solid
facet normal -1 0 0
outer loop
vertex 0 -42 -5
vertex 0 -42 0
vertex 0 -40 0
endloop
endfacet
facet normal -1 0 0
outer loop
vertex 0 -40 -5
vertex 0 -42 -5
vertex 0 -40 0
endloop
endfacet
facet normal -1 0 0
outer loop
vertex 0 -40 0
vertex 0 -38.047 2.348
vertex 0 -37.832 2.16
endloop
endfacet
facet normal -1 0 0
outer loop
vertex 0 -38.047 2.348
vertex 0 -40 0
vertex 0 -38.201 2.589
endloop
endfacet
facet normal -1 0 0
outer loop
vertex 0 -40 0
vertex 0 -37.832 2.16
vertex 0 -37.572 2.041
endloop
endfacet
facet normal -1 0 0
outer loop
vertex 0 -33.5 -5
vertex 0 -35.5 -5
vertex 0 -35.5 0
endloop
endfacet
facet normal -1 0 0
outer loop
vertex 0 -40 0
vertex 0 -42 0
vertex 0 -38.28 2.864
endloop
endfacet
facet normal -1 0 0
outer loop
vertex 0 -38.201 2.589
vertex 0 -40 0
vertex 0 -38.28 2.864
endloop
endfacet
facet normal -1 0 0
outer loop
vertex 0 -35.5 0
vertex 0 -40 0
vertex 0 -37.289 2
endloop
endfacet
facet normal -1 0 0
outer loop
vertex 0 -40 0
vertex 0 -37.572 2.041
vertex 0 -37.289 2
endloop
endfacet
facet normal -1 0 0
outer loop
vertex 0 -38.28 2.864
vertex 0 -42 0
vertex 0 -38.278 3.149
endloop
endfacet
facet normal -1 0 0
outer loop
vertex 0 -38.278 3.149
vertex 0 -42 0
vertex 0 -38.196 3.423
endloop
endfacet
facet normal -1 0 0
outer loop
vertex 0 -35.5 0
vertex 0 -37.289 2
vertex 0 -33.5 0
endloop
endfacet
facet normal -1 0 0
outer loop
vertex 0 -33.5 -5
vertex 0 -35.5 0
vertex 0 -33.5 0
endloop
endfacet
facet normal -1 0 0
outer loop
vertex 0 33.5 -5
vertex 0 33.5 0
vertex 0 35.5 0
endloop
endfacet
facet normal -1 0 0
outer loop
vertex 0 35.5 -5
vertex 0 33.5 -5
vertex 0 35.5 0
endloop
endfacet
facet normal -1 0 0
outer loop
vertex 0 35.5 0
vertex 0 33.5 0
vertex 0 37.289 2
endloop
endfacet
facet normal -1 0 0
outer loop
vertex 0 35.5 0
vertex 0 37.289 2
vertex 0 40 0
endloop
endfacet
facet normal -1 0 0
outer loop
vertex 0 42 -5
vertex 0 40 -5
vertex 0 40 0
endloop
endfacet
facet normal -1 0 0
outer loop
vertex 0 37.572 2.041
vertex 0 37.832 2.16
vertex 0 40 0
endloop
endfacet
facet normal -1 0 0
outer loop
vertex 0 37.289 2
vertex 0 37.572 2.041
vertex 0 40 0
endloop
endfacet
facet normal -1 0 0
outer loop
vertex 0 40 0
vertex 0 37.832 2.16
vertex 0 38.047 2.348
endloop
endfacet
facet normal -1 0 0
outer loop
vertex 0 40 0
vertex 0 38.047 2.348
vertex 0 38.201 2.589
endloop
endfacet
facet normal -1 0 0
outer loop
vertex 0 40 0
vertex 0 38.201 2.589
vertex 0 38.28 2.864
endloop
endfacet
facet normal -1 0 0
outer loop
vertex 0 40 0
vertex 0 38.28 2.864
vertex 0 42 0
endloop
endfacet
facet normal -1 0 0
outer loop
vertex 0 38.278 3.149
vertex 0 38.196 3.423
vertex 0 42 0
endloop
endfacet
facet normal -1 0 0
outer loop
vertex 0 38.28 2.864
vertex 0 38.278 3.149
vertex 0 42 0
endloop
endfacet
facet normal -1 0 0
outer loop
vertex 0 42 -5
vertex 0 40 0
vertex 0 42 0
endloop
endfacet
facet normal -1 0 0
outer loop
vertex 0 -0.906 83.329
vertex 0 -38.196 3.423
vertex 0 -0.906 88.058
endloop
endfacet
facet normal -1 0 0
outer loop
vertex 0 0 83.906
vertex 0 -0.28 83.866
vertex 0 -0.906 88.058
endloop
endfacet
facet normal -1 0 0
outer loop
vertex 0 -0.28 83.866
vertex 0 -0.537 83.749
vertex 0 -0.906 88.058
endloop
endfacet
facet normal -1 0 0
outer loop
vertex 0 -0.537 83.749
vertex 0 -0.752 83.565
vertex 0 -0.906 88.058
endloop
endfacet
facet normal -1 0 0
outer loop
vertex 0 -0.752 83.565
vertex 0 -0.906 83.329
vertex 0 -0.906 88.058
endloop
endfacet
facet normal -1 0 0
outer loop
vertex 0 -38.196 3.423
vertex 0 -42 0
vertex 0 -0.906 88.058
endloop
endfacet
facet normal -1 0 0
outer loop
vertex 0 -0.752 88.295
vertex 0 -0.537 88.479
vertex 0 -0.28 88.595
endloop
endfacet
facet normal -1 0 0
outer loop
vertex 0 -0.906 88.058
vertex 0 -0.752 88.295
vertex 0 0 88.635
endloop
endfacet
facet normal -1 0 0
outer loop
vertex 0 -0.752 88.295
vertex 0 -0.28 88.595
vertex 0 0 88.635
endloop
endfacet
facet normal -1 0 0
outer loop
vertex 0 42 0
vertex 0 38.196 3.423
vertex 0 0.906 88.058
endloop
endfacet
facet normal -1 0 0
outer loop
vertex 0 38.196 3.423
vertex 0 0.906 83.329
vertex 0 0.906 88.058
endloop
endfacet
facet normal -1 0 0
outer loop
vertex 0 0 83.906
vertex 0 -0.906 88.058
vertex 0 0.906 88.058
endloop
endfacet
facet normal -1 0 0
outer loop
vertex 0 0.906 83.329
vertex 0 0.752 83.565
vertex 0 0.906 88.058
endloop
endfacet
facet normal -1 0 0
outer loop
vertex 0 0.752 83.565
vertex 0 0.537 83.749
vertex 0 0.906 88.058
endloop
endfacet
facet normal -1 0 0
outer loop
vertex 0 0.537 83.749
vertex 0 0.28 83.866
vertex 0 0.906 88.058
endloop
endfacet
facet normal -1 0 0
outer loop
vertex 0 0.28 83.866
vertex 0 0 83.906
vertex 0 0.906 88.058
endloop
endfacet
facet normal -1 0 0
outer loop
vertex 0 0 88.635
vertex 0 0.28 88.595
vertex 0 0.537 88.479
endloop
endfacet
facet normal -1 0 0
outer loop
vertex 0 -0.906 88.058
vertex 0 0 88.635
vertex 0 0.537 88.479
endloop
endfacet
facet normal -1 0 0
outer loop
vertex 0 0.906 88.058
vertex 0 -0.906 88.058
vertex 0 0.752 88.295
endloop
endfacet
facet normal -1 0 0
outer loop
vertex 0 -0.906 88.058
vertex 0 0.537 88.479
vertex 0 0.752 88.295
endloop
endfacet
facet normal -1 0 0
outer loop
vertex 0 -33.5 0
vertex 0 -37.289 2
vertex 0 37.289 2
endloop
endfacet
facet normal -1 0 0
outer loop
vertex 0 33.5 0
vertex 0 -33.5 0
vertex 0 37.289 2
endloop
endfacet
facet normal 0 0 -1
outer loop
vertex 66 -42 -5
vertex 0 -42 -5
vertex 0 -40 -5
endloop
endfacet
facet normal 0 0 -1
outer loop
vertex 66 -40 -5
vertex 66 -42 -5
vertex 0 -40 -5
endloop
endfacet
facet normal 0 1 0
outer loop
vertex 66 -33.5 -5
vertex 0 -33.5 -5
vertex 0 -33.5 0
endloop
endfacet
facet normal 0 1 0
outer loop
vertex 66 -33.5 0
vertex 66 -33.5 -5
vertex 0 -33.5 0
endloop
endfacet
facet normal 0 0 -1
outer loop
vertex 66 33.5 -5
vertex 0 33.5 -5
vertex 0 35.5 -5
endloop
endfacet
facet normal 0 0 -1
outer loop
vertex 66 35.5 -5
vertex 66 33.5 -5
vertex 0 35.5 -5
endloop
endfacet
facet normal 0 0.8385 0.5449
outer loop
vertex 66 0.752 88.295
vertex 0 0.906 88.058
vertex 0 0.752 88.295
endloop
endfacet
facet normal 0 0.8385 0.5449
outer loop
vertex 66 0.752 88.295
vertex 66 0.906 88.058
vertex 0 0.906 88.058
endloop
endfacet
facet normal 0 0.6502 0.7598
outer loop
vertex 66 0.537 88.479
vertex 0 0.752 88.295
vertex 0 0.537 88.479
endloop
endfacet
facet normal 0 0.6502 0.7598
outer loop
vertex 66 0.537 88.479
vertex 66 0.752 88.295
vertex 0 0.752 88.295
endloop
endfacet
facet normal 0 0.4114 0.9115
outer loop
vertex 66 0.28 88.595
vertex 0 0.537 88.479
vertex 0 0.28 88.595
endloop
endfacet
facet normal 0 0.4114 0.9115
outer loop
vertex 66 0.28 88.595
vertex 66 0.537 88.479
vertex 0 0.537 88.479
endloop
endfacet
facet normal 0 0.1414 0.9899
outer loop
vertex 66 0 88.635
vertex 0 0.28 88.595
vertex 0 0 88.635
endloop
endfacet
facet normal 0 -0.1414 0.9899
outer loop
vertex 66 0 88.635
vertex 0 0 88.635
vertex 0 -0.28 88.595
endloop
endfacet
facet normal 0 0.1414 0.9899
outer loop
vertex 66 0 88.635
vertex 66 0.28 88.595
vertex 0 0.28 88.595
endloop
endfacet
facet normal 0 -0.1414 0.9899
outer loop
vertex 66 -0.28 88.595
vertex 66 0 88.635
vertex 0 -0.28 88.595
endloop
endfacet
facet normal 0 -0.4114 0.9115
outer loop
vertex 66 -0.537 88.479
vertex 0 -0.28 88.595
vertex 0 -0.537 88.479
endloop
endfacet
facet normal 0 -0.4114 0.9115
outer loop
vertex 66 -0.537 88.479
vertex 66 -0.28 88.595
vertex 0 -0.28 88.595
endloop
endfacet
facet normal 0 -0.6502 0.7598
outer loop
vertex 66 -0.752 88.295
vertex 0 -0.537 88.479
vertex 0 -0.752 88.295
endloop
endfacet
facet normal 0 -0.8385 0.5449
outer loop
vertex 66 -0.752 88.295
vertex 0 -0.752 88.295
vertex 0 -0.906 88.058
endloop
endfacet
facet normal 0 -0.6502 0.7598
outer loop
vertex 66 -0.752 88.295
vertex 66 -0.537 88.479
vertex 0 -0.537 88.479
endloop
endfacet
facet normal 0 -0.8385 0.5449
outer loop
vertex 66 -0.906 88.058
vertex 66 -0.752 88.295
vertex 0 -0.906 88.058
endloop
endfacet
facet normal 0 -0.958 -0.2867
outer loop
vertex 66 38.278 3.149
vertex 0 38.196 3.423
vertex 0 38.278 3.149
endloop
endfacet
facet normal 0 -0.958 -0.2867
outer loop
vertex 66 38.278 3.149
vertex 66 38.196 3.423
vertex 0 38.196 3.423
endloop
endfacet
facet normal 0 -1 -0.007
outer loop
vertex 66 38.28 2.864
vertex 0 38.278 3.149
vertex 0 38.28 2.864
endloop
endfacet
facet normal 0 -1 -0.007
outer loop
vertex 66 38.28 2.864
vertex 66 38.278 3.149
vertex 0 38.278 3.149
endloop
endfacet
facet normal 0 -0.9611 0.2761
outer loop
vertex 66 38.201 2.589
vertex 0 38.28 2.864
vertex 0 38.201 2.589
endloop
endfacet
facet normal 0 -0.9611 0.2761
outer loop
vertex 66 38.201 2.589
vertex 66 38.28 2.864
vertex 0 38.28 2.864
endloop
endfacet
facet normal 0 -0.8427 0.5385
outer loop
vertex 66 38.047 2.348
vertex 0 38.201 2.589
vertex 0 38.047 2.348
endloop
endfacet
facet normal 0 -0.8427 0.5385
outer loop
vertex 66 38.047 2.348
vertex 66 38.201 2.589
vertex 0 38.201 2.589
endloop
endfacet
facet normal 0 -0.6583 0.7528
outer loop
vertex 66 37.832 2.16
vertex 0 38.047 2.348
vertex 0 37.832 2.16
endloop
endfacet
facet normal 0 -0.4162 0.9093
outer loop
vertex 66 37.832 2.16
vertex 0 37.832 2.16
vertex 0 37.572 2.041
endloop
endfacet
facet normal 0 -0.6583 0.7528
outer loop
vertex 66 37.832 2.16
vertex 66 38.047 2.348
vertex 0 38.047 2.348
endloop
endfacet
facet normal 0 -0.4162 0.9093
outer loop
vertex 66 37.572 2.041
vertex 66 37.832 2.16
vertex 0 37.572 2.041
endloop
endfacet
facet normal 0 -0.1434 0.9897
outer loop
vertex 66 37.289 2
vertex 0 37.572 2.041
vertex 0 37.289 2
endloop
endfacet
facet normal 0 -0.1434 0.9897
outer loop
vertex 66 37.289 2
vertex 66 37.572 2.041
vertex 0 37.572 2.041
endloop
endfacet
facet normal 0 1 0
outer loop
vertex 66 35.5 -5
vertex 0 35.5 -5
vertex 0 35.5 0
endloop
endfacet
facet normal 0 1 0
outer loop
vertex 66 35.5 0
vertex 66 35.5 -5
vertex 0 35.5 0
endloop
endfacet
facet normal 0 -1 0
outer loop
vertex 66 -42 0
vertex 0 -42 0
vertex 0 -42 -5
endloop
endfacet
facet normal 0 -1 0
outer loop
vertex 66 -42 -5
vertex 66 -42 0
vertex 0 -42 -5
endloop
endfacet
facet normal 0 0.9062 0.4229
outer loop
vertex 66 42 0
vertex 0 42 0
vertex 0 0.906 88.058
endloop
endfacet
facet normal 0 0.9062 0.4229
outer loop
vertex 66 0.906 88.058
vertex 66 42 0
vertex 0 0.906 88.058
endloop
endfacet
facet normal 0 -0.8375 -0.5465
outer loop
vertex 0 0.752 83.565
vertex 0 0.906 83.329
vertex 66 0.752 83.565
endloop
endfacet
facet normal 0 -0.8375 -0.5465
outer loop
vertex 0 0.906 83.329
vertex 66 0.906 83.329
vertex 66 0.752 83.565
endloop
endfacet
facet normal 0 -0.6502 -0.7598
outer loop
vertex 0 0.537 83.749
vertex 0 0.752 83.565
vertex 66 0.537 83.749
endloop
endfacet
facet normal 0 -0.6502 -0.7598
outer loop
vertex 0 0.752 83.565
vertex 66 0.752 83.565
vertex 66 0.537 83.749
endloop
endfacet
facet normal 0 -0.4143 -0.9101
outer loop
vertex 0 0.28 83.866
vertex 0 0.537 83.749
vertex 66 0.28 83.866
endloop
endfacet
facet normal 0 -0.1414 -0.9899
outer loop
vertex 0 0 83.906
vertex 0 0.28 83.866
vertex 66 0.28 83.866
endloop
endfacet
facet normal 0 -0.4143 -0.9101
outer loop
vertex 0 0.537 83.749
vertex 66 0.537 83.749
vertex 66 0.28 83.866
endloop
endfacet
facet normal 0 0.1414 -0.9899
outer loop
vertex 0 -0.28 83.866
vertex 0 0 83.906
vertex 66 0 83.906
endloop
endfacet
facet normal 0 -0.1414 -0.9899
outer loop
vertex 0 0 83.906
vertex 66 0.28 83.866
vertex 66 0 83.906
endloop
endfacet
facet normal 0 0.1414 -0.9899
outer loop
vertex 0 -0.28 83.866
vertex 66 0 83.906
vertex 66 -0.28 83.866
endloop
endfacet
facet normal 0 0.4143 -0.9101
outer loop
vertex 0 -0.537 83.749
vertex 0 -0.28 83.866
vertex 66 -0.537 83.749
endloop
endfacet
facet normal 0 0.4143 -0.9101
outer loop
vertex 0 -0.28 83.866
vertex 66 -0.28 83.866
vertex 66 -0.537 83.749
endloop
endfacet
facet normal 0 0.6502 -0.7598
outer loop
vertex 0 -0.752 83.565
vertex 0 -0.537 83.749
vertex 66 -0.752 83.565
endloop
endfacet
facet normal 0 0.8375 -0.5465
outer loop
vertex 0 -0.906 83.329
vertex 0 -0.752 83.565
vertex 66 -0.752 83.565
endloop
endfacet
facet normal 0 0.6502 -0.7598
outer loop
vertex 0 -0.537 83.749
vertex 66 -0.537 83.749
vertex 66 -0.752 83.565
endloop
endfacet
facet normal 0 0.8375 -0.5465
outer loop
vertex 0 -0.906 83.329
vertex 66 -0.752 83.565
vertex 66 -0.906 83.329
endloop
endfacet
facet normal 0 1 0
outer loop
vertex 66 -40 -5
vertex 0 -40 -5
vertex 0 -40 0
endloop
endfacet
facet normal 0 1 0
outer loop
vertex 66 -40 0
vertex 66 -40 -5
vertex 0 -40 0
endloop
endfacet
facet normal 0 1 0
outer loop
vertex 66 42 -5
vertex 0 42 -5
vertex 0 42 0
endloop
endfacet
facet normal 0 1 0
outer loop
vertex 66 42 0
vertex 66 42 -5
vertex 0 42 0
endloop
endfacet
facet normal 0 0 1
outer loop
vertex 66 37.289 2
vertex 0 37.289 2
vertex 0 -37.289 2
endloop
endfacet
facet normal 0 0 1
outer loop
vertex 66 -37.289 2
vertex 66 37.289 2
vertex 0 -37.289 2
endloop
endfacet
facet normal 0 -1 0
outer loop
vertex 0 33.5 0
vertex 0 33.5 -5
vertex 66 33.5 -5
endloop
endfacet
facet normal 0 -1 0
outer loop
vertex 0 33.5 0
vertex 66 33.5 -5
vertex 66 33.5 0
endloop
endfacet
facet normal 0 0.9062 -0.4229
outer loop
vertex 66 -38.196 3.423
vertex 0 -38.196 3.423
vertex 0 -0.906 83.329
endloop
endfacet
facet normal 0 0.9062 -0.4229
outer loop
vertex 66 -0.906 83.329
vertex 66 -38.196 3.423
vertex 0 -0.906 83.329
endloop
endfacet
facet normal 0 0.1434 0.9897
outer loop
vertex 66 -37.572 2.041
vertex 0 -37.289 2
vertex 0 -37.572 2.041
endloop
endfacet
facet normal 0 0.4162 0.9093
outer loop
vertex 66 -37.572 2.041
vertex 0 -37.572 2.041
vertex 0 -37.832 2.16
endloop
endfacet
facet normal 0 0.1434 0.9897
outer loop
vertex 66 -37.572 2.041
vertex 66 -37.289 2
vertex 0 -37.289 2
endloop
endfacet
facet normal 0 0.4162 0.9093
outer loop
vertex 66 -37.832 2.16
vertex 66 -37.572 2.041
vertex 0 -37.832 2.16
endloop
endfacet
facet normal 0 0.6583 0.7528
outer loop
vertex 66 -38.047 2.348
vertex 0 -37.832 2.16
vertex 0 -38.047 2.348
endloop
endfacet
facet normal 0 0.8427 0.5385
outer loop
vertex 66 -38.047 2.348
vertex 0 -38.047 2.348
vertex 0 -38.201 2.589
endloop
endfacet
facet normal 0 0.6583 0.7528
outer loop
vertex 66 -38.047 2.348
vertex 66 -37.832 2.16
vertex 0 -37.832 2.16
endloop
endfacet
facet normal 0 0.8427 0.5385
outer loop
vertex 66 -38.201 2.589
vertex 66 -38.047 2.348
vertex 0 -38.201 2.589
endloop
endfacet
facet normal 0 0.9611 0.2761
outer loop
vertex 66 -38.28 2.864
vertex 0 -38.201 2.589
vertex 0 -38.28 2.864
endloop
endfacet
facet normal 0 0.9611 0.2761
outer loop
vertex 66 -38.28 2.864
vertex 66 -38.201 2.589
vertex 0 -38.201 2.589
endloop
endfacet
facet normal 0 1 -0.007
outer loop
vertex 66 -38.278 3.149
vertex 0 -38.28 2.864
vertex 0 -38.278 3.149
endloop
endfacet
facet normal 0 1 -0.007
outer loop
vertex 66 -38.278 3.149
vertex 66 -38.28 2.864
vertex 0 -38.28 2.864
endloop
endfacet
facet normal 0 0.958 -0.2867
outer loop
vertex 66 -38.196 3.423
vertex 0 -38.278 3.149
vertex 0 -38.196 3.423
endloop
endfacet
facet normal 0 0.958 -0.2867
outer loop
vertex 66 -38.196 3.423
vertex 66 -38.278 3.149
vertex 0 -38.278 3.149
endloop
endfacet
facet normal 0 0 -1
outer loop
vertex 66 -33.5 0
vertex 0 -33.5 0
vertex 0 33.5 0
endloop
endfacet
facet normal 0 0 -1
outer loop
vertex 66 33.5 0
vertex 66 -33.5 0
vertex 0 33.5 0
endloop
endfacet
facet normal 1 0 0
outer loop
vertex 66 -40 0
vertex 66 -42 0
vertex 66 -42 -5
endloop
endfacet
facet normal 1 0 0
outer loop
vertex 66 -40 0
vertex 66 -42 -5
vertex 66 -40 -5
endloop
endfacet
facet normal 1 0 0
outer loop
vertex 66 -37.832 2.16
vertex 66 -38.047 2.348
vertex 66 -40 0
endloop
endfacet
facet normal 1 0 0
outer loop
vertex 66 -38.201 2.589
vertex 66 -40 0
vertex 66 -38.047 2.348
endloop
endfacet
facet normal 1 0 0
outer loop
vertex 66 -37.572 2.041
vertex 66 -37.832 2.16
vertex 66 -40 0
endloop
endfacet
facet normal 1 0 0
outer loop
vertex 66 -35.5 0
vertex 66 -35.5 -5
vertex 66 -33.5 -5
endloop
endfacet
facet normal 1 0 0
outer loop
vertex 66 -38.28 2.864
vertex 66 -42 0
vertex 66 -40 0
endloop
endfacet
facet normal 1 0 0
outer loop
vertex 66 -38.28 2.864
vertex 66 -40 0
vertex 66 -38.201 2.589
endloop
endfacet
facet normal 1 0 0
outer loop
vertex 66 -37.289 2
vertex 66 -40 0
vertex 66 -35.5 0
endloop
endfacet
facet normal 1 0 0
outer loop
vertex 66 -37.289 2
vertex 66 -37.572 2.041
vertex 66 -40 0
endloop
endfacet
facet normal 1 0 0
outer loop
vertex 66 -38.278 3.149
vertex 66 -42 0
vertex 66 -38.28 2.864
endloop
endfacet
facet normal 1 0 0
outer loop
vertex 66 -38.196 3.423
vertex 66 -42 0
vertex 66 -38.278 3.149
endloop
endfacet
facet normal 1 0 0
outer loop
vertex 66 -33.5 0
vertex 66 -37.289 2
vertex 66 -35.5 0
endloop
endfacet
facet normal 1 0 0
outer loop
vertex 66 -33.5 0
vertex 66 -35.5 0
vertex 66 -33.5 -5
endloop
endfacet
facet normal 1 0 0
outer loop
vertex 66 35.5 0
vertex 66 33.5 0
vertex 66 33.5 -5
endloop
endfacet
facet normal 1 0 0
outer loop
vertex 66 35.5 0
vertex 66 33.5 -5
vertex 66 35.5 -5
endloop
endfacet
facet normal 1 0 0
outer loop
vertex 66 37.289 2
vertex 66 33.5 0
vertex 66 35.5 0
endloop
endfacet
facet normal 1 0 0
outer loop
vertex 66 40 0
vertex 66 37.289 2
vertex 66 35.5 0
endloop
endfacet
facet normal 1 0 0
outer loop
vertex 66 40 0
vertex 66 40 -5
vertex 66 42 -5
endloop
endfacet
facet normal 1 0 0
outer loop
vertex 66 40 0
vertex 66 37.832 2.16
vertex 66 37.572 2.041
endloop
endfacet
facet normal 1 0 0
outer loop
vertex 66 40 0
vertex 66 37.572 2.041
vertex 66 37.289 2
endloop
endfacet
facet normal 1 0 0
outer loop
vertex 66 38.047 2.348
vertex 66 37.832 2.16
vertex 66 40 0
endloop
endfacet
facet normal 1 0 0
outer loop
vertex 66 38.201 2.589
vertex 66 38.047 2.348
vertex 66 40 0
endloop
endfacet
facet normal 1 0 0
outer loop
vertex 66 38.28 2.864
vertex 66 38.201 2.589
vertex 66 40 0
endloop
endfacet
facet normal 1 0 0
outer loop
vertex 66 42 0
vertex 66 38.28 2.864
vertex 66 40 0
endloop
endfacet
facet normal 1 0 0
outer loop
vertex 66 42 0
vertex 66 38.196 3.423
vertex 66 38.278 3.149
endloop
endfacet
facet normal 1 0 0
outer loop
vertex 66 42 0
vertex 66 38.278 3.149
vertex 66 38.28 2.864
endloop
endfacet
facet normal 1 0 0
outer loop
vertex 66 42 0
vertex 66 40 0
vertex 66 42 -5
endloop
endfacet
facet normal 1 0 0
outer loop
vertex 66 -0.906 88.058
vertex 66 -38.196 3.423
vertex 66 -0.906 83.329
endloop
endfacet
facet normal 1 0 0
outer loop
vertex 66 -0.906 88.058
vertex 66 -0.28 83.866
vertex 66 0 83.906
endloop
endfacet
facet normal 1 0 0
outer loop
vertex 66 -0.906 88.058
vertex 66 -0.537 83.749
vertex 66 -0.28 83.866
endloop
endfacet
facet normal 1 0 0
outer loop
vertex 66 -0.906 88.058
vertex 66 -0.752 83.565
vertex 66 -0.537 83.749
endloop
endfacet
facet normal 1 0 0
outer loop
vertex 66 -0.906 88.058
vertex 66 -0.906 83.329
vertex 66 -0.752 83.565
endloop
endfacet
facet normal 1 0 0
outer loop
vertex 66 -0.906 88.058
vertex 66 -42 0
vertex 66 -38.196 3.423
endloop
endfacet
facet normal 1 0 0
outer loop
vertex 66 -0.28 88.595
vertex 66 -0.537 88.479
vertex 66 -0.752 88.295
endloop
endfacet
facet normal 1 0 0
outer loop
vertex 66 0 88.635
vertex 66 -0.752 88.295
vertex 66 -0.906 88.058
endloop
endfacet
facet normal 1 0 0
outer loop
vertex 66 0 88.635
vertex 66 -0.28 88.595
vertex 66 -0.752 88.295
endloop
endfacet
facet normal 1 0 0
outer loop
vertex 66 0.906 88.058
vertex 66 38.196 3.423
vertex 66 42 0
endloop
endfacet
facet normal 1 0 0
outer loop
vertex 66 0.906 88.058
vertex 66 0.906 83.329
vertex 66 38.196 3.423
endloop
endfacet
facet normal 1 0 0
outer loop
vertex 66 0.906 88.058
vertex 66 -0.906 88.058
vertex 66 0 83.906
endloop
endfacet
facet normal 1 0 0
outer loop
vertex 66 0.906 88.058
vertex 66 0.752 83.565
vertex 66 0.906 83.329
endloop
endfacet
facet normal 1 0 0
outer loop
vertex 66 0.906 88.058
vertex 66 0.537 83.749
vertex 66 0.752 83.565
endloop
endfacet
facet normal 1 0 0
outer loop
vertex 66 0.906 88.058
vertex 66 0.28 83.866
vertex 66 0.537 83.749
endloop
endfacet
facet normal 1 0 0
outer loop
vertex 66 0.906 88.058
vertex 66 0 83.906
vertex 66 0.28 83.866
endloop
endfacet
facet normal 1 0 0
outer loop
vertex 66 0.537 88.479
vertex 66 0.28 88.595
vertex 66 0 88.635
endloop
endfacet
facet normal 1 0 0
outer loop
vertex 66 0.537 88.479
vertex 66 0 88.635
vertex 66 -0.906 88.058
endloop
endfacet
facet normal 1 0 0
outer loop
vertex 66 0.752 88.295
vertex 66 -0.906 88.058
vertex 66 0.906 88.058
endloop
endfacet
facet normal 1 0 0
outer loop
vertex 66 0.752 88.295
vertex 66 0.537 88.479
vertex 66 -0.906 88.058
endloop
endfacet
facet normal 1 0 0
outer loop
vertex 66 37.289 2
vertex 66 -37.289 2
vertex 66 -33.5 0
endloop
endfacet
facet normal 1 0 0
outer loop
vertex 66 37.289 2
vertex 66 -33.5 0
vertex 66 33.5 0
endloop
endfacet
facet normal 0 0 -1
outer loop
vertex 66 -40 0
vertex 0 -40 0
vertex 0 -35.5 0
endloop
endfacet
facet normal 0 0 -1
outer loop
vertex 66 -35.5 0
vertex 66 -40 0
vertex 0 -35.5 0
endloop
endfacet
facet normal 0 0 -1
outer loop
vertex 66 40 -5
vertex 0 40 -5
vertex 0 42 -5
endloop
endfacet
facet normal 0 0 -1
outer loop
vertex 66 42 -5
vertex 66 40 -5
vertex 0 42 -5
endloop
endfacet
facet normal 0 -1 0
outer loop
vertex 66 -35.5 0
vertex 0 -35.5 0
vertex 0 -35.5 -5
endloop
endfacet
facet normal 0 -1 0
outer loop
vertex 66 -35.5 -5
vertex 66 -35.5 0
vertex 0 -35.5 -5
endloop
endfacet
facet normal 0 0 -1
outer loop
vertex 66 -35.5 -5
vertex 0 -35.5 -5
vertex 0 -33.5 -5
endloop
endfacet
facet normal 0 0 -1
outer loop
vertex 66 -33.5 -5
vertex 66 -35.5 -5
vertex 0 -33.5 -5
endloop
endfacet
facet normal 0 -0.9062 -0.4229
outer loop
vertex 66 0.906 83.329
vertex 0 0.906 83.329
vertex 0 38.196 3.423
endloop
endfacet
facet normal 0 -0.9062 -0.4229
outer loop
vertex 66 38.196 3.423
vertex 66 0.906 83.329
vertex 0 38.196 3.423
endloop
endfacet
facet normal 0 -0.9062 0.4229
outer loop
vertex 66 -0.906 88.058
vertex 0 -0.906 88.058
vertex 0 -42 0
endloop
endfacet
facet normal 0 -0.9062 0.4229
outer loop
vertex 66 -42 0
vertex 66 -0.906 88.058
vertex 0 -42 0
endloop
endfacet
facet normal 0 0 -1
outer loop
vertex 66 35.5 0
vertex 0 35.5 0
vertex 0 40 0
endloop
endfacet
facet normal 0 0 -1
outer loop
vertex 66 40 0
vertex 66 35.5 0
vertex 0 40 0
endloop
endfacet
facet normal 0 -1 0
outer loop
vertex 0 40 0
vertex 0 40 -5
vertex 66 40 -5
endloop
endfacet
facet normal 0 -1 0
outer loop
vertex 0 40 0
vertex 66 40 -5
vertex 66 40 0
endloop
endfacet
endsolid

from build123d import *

# Parameters (mm, degrees)
F0_W     = 2
F0_H     = 5
F1_DEPTH = 66
F2_R     = 1
F3_R     = 1


with BuildPart() as f1:
    # F0 (on Right) → F1 (new body)
    with BuildSketch(Plane.YZ):
        Polygon((-33.5, 0), (0, 0), (33.5, 0), (35.5, 0), (40, 0), (42, 0), (0, 90), (-42, 0), (-42, -5), (-40, -5), (-40, 0), (-35.5, 0), (-35.5, -5), (-33.5, -5), align=None)
        Polygon((38.859607, 2), (0, 2), (-38.859607, 2), (0, 85.270587), align=None, mode=Mode.SUBTRACT)
        with Locations((34.5, -2.5)):
            Rectangle(F0_W, F0_H)
        with Locations((41, -2.5)):
            Rectangle(F0_W, F0_H)
    extrude(amount=F1_DEPTH)

    # F2
    f2_edges = [f1.edges().sort_by_distance(p)[0] for p in [
        (33, 0, 90),
    ]]
    fillet(f2_edges, radius=F2_R)

    # F3
    f3_edges = [f1.edges().sort_by_distance(p)[0] for p in [
        (33, 0, 85.270587),
        (33, 38.859607, 2),
        (33, -38.859607, 2),
    ]]
    fillet(f3_edges, radius=F3_R)


solid = f1.part
